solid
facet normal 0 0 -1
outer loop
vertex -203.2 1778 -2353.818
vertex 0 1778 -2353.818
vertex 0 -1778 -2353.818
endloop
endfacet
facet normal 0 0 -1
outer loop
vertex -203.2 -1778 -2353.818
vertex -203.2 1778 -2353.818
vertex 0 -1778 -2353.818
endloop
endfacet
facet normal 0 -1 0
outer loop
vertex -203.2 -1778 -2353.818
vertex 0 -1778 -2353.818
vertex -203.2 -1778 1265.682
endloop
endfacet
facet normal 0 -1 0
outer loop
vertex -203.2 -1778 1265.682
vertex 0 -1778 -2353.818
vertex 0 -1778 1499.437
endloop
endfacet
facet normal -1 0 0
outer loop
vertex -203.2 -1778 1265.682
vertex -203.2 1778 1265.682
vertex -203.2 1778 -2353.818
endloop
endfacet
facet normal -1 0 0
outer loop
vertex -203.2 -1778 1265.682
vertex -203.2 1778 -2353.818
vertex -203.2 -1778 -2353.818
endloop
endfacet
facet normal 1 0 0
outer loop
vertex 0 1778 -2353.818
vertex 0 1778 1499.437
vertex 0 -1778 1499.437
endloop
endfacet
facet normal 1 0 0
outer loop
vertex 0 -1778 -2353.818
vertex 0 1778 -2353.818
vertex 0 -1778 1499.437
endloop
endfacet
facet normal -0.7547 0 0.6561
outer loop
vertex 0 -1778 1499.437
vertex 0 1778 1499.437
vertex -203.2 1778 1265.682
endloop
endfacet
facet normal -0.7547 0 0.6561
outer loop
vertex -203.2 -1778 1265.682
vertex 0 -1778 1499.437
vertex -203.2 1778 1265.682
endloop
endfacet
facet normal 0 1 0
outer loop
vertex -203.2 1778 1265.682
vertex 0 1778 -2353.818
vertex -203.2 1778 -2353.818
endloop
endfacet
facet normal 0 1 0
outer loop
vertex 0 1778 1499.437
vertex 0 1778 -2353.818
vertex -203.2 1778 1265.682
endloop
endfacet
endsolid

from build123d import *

# Parameters (mm, degrees)
F0_W     = 3556
F0_H     = 4707.636
F1_DEPTH = 203.2
F3_DEPTH = 3556
F5_ANGLE = 180


with BuildPart() as f1:
    # F0 (on Right) → F1 (new body)
    with BuildSketch(Plane.YZ):
        Rectangle(F0_W, F0_H)
    extrude(amount=F1_DEPTH)

    # F2 (on face) → F3 (cut)
    with BuildSketch(Plane.XZ.offset(1778)):
        Polygon((0, 1499.43686), (203.2, 1265.682), (203.2, 2353.818), (0, 2353.818), align=None)
    extrude(amount=-F3_DEPTH, mode=Mode.SUBTRACT)


with BuildPart() as f1_1:
    # F5: moved
    add(f1.part.rotate(Axis((0, 0, -714.977086), (0, 0, -1)), F5_ANGLE))


solid = f1_1.part
